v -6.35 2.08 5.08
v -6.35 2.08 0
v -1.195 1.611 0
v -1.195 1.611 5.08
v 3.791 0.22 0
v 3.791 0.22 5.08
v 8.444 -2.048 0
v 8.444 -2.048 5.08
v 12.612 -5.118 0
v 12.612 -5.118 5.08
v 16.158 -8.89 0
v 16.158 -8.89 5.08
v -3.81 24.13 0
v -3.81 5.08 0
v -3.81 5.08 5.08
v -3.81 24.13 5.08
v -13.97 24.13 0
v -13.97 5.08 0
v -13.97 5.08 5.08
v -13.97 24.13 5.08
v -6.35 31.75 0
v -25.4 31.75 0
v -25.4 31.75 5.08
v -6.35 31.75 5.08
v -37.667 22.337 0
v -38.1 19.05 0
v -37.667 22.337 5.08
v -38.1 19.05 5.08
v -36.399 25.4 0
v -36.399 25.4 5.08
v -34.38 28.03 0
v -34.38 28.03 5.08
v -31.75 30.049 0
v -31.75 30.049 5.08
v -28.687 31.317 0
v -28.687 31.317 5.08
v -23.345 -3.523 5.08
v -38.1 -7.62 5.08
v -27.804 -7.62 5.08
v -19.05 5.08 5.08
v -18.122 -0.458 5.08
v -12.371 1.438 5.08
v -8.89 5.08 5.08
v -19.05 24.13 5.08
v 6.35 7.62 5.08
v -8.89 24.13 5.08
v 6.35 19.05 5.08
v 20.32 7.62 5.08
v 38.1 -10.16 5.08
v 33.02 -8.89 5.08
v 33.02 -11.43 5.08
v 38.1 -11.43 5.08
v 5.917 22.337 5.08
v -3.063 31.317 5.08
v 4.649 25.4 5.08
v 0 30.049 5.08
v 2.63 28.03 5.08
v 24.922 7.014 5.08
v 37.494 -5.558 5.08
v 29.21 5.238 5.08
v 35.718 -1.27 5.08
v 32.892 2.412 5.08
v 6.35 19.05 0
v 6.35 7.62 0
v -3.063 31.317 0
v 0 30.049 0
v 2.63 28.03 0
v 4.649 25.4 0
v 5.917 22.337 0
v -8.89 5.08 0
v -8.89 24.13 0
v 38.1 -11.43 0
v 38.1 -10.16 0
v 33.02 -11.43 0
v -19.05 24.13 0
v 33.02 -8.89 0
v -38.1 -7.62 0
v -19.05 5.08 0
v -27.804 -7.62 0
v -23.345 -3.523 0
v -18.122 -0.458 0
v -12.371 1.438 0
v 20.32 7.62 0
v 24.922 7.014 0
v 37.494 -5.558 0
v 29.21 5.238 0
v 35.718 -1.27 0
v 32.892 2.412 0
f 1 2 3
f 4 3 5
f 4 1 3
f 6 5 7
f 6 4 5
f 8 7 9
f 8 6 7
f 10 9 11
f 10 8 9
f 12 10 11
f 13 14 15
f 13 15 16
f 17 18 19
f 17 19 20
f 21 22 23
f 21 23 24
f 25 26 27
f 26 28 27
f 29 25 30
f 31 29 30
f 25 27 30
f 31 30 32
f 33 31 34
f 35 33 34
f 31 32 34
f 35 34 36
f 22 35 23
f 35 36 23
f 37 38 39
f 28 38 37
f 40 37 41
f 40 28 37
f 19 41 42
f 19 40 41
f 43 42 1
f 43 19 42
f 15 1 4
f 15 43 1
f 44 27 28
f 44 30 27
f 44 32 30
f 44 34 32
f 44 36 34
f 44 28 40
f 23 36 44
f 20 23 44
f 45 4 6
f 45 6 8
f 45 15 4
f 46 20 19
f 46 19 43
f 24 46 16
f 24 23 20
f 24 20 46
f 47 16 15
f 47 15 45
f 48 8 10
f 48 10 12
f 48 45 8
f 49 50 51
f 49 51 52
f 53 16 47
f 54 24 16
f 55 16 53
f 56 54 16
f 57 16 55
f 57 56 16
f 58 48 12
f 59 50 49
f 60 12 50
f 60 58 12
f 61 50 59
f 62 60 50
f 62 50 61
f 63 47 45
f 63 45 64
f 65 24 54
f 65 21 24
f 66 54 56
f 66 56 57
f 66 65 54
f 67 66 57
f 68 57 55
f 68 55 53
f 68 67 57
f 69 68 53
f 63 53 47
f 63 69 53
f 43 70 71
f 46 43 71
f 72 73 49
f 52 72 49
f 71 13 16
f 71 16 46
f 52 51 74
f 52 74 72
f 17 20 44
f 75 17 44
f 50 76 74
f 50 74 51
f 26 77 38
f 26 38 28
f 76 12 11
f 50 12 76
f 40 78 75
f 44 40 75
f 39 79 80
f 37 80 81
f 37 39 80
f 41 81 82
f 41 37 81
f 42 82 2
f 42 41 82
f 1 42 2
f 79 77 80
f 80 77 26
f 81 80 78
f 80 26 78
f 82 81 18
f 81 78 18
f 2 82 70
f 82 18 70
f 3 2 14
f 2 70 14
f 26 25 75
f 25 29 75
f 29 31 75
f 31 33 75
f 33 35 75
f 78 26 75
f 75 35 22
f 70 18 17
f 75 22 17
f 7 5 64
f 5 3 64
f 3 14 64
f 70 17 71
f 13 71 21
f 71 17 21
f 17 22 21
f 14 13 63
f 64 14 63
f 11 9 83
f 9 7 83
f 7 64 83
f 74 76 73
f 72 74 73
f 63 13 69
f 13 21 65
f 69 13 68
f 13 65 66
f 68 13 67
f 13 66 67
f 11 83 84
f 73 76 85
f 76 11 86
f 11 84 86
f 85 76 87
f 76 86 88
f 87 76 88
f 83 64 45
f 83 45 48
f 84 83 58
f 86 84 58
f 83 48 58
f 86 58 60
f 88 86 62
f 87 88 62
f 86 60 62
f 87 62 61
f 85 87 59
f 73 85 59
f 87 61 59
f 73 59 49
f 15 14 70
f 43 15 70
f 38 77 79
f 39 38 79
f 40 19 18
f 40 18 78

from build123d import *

# Parameters (mm, degrees)
SKETCH1_W           = 76.2
SKETCH1_H           = 15.24
BOSS_EXTRUDE1_DEPTH = 5.08
SKETCH2_W           = 25.4
SKETCH2_H           = 5.08
BOSS_EXTRUDE2_DEPTH = 31.75
SKETCH4_W           = 5.08
SKETCH4_H           = 19.05
CUT_EXTRUDE2_DEPTH  = 50.8
SKETCH6_W           = 5.08
SKETCH6_H           = 34.29
BOSS_EXTRUDE3_DEPTH = 19.05
SKETCH7_W           = 5.08
SKETCH7_H           = 19.05
CUT_EXTRUDE4_DEPTH  = 19.05
FILLET1_R           = 12.7
SKETCH12_W          = 5.08
SKETCH12_H          = 5.08
BOSS_EXTRUDE5_DEPTH = 3.81
SKETCH14_W          = 31.440322014
SKETCH14_H          = 5.08
BOSS_EXTRUDE7_DEPTH = 1.27
CUT_EXTRUDE7_DEPTH  = 50.854577523
FILLET3_R           = 17.78


with BuildPart() as part:
    # Sketch1 → Boss-Extrude1 (new body)
    with BuildSketch(Plane.XY):
        Rectangle(SKETCH1_W, SKETCH1_H)
    extrude(amount=BOSS_EXTRUDE1_DEPTH)

    # Sketch2 → Boss-Extrude2 (add)
    with BuildSketch(Plane(origin=(0, 0, 0), x_dir=(1, 0, 0), z_dir=(0, 1, 0))):
        with Locations((-6.35, -2.54)):
            Rectangle(SKETCH2_W, SKETCH2_H)
    extrude(amount=BOSS_EXTRUDE2_DEPTH)

    # Sketch4 → Cut-Extrude2 (cut)
    with BuildSketch(Plane(origin=(0, 0, 0), x_dir=(-1, 0, 0), z_dir=(0, 0, -1))):
        with Locations((6.35, 14.605)):
            Rectangle(SKETCH4_W, SKETCH4_H)
    extrude(amount=-CUT_EXTRUDE2_DEPTH, mode=Mode.SUBTRACT)

    # Sketch6 → Boss-Extrude3 (add)
    with BuildSketch(Plane.ZY.offset(19.05)):
        with Locations((2.54, 14.605)):
            Rectangle(SKETCH6_W, SKETCH6_H)
    extrude(amount=BOSS_EXTRUDE3_DEPTH)

    # Sketch7 → Cut-Extrude4 (cut)
    with BuildSketch(Plane(origin=(0, 0, 0), x_dir=(-1, 0, 0), z_dir=(0, 0, -1))):
        with Locations((16.51, 14.605)):
            Rectangle(SKETCH7_W, SKETCH7_H)
    extrude(amount=-CUT_EXTRUDE4_DEPTH, mode=Mode.SUBTRACT)

    # Fillet1
    fillet1_edges = [part.edges().sort_by_distance(p)[0] for p in [
        (6.35, 31.75, 2.54),
        (-38.1, 31.75, 2.54),
    ]]
    fillet(fillet1_edges, radius=FILLET1_R)

    # Sketch12 → Boss-Extrude5 (add)
    with BuildSketch(Plane.XZ.offset(7.62)):
        with Locations((35.56, 2.54)):
            Rectangle(SKETCH12_W, SKETCH12_H)
    extrude(amount=BOSS_EXTRUDE5_DEPTH)

    # Sketch14 → Boss-Extrude7 (add)
    with BuildSketch(Plane.XZ.offset(7.62)):
        with Locations((17.299838993, 2.54)):
            Rectangle(SKETCH14_W, SKETCH14_H)
    extrude(amount=BOSS_EXTRUDE7_DEPTH)

    # Sketch9 → Cut-Extrude7 (cut, through all)
    with BuildSketch(Plane.XY.offset(5.08)):
        with BuildLine():
            Line((22.048333309, -23.322415838), (-34.748333309, -23.322415838))
            ThreePointArc((-34.748333309, -23.322415838), (-25.400905918, -5.197262826), (-6.35, 2.08))
            ThreePointArc((-6.35, 2.08), (12.700905918, -5.197262826), (22.048333309, -23.322415838))
        make_face()
    extrude(amount=-CUT_EXTRUDE7_DEPTH, mode=Mode.SUBTRACT)

    # Fillet3
    fillet3_edges = [part.edges().sort_by_distance(p)[0] for p in [
        (38.1, 7.62, 2.54),
    ]]
    fillet(fillet3_edges, radius=FILLET3_R)


solid = part.part
